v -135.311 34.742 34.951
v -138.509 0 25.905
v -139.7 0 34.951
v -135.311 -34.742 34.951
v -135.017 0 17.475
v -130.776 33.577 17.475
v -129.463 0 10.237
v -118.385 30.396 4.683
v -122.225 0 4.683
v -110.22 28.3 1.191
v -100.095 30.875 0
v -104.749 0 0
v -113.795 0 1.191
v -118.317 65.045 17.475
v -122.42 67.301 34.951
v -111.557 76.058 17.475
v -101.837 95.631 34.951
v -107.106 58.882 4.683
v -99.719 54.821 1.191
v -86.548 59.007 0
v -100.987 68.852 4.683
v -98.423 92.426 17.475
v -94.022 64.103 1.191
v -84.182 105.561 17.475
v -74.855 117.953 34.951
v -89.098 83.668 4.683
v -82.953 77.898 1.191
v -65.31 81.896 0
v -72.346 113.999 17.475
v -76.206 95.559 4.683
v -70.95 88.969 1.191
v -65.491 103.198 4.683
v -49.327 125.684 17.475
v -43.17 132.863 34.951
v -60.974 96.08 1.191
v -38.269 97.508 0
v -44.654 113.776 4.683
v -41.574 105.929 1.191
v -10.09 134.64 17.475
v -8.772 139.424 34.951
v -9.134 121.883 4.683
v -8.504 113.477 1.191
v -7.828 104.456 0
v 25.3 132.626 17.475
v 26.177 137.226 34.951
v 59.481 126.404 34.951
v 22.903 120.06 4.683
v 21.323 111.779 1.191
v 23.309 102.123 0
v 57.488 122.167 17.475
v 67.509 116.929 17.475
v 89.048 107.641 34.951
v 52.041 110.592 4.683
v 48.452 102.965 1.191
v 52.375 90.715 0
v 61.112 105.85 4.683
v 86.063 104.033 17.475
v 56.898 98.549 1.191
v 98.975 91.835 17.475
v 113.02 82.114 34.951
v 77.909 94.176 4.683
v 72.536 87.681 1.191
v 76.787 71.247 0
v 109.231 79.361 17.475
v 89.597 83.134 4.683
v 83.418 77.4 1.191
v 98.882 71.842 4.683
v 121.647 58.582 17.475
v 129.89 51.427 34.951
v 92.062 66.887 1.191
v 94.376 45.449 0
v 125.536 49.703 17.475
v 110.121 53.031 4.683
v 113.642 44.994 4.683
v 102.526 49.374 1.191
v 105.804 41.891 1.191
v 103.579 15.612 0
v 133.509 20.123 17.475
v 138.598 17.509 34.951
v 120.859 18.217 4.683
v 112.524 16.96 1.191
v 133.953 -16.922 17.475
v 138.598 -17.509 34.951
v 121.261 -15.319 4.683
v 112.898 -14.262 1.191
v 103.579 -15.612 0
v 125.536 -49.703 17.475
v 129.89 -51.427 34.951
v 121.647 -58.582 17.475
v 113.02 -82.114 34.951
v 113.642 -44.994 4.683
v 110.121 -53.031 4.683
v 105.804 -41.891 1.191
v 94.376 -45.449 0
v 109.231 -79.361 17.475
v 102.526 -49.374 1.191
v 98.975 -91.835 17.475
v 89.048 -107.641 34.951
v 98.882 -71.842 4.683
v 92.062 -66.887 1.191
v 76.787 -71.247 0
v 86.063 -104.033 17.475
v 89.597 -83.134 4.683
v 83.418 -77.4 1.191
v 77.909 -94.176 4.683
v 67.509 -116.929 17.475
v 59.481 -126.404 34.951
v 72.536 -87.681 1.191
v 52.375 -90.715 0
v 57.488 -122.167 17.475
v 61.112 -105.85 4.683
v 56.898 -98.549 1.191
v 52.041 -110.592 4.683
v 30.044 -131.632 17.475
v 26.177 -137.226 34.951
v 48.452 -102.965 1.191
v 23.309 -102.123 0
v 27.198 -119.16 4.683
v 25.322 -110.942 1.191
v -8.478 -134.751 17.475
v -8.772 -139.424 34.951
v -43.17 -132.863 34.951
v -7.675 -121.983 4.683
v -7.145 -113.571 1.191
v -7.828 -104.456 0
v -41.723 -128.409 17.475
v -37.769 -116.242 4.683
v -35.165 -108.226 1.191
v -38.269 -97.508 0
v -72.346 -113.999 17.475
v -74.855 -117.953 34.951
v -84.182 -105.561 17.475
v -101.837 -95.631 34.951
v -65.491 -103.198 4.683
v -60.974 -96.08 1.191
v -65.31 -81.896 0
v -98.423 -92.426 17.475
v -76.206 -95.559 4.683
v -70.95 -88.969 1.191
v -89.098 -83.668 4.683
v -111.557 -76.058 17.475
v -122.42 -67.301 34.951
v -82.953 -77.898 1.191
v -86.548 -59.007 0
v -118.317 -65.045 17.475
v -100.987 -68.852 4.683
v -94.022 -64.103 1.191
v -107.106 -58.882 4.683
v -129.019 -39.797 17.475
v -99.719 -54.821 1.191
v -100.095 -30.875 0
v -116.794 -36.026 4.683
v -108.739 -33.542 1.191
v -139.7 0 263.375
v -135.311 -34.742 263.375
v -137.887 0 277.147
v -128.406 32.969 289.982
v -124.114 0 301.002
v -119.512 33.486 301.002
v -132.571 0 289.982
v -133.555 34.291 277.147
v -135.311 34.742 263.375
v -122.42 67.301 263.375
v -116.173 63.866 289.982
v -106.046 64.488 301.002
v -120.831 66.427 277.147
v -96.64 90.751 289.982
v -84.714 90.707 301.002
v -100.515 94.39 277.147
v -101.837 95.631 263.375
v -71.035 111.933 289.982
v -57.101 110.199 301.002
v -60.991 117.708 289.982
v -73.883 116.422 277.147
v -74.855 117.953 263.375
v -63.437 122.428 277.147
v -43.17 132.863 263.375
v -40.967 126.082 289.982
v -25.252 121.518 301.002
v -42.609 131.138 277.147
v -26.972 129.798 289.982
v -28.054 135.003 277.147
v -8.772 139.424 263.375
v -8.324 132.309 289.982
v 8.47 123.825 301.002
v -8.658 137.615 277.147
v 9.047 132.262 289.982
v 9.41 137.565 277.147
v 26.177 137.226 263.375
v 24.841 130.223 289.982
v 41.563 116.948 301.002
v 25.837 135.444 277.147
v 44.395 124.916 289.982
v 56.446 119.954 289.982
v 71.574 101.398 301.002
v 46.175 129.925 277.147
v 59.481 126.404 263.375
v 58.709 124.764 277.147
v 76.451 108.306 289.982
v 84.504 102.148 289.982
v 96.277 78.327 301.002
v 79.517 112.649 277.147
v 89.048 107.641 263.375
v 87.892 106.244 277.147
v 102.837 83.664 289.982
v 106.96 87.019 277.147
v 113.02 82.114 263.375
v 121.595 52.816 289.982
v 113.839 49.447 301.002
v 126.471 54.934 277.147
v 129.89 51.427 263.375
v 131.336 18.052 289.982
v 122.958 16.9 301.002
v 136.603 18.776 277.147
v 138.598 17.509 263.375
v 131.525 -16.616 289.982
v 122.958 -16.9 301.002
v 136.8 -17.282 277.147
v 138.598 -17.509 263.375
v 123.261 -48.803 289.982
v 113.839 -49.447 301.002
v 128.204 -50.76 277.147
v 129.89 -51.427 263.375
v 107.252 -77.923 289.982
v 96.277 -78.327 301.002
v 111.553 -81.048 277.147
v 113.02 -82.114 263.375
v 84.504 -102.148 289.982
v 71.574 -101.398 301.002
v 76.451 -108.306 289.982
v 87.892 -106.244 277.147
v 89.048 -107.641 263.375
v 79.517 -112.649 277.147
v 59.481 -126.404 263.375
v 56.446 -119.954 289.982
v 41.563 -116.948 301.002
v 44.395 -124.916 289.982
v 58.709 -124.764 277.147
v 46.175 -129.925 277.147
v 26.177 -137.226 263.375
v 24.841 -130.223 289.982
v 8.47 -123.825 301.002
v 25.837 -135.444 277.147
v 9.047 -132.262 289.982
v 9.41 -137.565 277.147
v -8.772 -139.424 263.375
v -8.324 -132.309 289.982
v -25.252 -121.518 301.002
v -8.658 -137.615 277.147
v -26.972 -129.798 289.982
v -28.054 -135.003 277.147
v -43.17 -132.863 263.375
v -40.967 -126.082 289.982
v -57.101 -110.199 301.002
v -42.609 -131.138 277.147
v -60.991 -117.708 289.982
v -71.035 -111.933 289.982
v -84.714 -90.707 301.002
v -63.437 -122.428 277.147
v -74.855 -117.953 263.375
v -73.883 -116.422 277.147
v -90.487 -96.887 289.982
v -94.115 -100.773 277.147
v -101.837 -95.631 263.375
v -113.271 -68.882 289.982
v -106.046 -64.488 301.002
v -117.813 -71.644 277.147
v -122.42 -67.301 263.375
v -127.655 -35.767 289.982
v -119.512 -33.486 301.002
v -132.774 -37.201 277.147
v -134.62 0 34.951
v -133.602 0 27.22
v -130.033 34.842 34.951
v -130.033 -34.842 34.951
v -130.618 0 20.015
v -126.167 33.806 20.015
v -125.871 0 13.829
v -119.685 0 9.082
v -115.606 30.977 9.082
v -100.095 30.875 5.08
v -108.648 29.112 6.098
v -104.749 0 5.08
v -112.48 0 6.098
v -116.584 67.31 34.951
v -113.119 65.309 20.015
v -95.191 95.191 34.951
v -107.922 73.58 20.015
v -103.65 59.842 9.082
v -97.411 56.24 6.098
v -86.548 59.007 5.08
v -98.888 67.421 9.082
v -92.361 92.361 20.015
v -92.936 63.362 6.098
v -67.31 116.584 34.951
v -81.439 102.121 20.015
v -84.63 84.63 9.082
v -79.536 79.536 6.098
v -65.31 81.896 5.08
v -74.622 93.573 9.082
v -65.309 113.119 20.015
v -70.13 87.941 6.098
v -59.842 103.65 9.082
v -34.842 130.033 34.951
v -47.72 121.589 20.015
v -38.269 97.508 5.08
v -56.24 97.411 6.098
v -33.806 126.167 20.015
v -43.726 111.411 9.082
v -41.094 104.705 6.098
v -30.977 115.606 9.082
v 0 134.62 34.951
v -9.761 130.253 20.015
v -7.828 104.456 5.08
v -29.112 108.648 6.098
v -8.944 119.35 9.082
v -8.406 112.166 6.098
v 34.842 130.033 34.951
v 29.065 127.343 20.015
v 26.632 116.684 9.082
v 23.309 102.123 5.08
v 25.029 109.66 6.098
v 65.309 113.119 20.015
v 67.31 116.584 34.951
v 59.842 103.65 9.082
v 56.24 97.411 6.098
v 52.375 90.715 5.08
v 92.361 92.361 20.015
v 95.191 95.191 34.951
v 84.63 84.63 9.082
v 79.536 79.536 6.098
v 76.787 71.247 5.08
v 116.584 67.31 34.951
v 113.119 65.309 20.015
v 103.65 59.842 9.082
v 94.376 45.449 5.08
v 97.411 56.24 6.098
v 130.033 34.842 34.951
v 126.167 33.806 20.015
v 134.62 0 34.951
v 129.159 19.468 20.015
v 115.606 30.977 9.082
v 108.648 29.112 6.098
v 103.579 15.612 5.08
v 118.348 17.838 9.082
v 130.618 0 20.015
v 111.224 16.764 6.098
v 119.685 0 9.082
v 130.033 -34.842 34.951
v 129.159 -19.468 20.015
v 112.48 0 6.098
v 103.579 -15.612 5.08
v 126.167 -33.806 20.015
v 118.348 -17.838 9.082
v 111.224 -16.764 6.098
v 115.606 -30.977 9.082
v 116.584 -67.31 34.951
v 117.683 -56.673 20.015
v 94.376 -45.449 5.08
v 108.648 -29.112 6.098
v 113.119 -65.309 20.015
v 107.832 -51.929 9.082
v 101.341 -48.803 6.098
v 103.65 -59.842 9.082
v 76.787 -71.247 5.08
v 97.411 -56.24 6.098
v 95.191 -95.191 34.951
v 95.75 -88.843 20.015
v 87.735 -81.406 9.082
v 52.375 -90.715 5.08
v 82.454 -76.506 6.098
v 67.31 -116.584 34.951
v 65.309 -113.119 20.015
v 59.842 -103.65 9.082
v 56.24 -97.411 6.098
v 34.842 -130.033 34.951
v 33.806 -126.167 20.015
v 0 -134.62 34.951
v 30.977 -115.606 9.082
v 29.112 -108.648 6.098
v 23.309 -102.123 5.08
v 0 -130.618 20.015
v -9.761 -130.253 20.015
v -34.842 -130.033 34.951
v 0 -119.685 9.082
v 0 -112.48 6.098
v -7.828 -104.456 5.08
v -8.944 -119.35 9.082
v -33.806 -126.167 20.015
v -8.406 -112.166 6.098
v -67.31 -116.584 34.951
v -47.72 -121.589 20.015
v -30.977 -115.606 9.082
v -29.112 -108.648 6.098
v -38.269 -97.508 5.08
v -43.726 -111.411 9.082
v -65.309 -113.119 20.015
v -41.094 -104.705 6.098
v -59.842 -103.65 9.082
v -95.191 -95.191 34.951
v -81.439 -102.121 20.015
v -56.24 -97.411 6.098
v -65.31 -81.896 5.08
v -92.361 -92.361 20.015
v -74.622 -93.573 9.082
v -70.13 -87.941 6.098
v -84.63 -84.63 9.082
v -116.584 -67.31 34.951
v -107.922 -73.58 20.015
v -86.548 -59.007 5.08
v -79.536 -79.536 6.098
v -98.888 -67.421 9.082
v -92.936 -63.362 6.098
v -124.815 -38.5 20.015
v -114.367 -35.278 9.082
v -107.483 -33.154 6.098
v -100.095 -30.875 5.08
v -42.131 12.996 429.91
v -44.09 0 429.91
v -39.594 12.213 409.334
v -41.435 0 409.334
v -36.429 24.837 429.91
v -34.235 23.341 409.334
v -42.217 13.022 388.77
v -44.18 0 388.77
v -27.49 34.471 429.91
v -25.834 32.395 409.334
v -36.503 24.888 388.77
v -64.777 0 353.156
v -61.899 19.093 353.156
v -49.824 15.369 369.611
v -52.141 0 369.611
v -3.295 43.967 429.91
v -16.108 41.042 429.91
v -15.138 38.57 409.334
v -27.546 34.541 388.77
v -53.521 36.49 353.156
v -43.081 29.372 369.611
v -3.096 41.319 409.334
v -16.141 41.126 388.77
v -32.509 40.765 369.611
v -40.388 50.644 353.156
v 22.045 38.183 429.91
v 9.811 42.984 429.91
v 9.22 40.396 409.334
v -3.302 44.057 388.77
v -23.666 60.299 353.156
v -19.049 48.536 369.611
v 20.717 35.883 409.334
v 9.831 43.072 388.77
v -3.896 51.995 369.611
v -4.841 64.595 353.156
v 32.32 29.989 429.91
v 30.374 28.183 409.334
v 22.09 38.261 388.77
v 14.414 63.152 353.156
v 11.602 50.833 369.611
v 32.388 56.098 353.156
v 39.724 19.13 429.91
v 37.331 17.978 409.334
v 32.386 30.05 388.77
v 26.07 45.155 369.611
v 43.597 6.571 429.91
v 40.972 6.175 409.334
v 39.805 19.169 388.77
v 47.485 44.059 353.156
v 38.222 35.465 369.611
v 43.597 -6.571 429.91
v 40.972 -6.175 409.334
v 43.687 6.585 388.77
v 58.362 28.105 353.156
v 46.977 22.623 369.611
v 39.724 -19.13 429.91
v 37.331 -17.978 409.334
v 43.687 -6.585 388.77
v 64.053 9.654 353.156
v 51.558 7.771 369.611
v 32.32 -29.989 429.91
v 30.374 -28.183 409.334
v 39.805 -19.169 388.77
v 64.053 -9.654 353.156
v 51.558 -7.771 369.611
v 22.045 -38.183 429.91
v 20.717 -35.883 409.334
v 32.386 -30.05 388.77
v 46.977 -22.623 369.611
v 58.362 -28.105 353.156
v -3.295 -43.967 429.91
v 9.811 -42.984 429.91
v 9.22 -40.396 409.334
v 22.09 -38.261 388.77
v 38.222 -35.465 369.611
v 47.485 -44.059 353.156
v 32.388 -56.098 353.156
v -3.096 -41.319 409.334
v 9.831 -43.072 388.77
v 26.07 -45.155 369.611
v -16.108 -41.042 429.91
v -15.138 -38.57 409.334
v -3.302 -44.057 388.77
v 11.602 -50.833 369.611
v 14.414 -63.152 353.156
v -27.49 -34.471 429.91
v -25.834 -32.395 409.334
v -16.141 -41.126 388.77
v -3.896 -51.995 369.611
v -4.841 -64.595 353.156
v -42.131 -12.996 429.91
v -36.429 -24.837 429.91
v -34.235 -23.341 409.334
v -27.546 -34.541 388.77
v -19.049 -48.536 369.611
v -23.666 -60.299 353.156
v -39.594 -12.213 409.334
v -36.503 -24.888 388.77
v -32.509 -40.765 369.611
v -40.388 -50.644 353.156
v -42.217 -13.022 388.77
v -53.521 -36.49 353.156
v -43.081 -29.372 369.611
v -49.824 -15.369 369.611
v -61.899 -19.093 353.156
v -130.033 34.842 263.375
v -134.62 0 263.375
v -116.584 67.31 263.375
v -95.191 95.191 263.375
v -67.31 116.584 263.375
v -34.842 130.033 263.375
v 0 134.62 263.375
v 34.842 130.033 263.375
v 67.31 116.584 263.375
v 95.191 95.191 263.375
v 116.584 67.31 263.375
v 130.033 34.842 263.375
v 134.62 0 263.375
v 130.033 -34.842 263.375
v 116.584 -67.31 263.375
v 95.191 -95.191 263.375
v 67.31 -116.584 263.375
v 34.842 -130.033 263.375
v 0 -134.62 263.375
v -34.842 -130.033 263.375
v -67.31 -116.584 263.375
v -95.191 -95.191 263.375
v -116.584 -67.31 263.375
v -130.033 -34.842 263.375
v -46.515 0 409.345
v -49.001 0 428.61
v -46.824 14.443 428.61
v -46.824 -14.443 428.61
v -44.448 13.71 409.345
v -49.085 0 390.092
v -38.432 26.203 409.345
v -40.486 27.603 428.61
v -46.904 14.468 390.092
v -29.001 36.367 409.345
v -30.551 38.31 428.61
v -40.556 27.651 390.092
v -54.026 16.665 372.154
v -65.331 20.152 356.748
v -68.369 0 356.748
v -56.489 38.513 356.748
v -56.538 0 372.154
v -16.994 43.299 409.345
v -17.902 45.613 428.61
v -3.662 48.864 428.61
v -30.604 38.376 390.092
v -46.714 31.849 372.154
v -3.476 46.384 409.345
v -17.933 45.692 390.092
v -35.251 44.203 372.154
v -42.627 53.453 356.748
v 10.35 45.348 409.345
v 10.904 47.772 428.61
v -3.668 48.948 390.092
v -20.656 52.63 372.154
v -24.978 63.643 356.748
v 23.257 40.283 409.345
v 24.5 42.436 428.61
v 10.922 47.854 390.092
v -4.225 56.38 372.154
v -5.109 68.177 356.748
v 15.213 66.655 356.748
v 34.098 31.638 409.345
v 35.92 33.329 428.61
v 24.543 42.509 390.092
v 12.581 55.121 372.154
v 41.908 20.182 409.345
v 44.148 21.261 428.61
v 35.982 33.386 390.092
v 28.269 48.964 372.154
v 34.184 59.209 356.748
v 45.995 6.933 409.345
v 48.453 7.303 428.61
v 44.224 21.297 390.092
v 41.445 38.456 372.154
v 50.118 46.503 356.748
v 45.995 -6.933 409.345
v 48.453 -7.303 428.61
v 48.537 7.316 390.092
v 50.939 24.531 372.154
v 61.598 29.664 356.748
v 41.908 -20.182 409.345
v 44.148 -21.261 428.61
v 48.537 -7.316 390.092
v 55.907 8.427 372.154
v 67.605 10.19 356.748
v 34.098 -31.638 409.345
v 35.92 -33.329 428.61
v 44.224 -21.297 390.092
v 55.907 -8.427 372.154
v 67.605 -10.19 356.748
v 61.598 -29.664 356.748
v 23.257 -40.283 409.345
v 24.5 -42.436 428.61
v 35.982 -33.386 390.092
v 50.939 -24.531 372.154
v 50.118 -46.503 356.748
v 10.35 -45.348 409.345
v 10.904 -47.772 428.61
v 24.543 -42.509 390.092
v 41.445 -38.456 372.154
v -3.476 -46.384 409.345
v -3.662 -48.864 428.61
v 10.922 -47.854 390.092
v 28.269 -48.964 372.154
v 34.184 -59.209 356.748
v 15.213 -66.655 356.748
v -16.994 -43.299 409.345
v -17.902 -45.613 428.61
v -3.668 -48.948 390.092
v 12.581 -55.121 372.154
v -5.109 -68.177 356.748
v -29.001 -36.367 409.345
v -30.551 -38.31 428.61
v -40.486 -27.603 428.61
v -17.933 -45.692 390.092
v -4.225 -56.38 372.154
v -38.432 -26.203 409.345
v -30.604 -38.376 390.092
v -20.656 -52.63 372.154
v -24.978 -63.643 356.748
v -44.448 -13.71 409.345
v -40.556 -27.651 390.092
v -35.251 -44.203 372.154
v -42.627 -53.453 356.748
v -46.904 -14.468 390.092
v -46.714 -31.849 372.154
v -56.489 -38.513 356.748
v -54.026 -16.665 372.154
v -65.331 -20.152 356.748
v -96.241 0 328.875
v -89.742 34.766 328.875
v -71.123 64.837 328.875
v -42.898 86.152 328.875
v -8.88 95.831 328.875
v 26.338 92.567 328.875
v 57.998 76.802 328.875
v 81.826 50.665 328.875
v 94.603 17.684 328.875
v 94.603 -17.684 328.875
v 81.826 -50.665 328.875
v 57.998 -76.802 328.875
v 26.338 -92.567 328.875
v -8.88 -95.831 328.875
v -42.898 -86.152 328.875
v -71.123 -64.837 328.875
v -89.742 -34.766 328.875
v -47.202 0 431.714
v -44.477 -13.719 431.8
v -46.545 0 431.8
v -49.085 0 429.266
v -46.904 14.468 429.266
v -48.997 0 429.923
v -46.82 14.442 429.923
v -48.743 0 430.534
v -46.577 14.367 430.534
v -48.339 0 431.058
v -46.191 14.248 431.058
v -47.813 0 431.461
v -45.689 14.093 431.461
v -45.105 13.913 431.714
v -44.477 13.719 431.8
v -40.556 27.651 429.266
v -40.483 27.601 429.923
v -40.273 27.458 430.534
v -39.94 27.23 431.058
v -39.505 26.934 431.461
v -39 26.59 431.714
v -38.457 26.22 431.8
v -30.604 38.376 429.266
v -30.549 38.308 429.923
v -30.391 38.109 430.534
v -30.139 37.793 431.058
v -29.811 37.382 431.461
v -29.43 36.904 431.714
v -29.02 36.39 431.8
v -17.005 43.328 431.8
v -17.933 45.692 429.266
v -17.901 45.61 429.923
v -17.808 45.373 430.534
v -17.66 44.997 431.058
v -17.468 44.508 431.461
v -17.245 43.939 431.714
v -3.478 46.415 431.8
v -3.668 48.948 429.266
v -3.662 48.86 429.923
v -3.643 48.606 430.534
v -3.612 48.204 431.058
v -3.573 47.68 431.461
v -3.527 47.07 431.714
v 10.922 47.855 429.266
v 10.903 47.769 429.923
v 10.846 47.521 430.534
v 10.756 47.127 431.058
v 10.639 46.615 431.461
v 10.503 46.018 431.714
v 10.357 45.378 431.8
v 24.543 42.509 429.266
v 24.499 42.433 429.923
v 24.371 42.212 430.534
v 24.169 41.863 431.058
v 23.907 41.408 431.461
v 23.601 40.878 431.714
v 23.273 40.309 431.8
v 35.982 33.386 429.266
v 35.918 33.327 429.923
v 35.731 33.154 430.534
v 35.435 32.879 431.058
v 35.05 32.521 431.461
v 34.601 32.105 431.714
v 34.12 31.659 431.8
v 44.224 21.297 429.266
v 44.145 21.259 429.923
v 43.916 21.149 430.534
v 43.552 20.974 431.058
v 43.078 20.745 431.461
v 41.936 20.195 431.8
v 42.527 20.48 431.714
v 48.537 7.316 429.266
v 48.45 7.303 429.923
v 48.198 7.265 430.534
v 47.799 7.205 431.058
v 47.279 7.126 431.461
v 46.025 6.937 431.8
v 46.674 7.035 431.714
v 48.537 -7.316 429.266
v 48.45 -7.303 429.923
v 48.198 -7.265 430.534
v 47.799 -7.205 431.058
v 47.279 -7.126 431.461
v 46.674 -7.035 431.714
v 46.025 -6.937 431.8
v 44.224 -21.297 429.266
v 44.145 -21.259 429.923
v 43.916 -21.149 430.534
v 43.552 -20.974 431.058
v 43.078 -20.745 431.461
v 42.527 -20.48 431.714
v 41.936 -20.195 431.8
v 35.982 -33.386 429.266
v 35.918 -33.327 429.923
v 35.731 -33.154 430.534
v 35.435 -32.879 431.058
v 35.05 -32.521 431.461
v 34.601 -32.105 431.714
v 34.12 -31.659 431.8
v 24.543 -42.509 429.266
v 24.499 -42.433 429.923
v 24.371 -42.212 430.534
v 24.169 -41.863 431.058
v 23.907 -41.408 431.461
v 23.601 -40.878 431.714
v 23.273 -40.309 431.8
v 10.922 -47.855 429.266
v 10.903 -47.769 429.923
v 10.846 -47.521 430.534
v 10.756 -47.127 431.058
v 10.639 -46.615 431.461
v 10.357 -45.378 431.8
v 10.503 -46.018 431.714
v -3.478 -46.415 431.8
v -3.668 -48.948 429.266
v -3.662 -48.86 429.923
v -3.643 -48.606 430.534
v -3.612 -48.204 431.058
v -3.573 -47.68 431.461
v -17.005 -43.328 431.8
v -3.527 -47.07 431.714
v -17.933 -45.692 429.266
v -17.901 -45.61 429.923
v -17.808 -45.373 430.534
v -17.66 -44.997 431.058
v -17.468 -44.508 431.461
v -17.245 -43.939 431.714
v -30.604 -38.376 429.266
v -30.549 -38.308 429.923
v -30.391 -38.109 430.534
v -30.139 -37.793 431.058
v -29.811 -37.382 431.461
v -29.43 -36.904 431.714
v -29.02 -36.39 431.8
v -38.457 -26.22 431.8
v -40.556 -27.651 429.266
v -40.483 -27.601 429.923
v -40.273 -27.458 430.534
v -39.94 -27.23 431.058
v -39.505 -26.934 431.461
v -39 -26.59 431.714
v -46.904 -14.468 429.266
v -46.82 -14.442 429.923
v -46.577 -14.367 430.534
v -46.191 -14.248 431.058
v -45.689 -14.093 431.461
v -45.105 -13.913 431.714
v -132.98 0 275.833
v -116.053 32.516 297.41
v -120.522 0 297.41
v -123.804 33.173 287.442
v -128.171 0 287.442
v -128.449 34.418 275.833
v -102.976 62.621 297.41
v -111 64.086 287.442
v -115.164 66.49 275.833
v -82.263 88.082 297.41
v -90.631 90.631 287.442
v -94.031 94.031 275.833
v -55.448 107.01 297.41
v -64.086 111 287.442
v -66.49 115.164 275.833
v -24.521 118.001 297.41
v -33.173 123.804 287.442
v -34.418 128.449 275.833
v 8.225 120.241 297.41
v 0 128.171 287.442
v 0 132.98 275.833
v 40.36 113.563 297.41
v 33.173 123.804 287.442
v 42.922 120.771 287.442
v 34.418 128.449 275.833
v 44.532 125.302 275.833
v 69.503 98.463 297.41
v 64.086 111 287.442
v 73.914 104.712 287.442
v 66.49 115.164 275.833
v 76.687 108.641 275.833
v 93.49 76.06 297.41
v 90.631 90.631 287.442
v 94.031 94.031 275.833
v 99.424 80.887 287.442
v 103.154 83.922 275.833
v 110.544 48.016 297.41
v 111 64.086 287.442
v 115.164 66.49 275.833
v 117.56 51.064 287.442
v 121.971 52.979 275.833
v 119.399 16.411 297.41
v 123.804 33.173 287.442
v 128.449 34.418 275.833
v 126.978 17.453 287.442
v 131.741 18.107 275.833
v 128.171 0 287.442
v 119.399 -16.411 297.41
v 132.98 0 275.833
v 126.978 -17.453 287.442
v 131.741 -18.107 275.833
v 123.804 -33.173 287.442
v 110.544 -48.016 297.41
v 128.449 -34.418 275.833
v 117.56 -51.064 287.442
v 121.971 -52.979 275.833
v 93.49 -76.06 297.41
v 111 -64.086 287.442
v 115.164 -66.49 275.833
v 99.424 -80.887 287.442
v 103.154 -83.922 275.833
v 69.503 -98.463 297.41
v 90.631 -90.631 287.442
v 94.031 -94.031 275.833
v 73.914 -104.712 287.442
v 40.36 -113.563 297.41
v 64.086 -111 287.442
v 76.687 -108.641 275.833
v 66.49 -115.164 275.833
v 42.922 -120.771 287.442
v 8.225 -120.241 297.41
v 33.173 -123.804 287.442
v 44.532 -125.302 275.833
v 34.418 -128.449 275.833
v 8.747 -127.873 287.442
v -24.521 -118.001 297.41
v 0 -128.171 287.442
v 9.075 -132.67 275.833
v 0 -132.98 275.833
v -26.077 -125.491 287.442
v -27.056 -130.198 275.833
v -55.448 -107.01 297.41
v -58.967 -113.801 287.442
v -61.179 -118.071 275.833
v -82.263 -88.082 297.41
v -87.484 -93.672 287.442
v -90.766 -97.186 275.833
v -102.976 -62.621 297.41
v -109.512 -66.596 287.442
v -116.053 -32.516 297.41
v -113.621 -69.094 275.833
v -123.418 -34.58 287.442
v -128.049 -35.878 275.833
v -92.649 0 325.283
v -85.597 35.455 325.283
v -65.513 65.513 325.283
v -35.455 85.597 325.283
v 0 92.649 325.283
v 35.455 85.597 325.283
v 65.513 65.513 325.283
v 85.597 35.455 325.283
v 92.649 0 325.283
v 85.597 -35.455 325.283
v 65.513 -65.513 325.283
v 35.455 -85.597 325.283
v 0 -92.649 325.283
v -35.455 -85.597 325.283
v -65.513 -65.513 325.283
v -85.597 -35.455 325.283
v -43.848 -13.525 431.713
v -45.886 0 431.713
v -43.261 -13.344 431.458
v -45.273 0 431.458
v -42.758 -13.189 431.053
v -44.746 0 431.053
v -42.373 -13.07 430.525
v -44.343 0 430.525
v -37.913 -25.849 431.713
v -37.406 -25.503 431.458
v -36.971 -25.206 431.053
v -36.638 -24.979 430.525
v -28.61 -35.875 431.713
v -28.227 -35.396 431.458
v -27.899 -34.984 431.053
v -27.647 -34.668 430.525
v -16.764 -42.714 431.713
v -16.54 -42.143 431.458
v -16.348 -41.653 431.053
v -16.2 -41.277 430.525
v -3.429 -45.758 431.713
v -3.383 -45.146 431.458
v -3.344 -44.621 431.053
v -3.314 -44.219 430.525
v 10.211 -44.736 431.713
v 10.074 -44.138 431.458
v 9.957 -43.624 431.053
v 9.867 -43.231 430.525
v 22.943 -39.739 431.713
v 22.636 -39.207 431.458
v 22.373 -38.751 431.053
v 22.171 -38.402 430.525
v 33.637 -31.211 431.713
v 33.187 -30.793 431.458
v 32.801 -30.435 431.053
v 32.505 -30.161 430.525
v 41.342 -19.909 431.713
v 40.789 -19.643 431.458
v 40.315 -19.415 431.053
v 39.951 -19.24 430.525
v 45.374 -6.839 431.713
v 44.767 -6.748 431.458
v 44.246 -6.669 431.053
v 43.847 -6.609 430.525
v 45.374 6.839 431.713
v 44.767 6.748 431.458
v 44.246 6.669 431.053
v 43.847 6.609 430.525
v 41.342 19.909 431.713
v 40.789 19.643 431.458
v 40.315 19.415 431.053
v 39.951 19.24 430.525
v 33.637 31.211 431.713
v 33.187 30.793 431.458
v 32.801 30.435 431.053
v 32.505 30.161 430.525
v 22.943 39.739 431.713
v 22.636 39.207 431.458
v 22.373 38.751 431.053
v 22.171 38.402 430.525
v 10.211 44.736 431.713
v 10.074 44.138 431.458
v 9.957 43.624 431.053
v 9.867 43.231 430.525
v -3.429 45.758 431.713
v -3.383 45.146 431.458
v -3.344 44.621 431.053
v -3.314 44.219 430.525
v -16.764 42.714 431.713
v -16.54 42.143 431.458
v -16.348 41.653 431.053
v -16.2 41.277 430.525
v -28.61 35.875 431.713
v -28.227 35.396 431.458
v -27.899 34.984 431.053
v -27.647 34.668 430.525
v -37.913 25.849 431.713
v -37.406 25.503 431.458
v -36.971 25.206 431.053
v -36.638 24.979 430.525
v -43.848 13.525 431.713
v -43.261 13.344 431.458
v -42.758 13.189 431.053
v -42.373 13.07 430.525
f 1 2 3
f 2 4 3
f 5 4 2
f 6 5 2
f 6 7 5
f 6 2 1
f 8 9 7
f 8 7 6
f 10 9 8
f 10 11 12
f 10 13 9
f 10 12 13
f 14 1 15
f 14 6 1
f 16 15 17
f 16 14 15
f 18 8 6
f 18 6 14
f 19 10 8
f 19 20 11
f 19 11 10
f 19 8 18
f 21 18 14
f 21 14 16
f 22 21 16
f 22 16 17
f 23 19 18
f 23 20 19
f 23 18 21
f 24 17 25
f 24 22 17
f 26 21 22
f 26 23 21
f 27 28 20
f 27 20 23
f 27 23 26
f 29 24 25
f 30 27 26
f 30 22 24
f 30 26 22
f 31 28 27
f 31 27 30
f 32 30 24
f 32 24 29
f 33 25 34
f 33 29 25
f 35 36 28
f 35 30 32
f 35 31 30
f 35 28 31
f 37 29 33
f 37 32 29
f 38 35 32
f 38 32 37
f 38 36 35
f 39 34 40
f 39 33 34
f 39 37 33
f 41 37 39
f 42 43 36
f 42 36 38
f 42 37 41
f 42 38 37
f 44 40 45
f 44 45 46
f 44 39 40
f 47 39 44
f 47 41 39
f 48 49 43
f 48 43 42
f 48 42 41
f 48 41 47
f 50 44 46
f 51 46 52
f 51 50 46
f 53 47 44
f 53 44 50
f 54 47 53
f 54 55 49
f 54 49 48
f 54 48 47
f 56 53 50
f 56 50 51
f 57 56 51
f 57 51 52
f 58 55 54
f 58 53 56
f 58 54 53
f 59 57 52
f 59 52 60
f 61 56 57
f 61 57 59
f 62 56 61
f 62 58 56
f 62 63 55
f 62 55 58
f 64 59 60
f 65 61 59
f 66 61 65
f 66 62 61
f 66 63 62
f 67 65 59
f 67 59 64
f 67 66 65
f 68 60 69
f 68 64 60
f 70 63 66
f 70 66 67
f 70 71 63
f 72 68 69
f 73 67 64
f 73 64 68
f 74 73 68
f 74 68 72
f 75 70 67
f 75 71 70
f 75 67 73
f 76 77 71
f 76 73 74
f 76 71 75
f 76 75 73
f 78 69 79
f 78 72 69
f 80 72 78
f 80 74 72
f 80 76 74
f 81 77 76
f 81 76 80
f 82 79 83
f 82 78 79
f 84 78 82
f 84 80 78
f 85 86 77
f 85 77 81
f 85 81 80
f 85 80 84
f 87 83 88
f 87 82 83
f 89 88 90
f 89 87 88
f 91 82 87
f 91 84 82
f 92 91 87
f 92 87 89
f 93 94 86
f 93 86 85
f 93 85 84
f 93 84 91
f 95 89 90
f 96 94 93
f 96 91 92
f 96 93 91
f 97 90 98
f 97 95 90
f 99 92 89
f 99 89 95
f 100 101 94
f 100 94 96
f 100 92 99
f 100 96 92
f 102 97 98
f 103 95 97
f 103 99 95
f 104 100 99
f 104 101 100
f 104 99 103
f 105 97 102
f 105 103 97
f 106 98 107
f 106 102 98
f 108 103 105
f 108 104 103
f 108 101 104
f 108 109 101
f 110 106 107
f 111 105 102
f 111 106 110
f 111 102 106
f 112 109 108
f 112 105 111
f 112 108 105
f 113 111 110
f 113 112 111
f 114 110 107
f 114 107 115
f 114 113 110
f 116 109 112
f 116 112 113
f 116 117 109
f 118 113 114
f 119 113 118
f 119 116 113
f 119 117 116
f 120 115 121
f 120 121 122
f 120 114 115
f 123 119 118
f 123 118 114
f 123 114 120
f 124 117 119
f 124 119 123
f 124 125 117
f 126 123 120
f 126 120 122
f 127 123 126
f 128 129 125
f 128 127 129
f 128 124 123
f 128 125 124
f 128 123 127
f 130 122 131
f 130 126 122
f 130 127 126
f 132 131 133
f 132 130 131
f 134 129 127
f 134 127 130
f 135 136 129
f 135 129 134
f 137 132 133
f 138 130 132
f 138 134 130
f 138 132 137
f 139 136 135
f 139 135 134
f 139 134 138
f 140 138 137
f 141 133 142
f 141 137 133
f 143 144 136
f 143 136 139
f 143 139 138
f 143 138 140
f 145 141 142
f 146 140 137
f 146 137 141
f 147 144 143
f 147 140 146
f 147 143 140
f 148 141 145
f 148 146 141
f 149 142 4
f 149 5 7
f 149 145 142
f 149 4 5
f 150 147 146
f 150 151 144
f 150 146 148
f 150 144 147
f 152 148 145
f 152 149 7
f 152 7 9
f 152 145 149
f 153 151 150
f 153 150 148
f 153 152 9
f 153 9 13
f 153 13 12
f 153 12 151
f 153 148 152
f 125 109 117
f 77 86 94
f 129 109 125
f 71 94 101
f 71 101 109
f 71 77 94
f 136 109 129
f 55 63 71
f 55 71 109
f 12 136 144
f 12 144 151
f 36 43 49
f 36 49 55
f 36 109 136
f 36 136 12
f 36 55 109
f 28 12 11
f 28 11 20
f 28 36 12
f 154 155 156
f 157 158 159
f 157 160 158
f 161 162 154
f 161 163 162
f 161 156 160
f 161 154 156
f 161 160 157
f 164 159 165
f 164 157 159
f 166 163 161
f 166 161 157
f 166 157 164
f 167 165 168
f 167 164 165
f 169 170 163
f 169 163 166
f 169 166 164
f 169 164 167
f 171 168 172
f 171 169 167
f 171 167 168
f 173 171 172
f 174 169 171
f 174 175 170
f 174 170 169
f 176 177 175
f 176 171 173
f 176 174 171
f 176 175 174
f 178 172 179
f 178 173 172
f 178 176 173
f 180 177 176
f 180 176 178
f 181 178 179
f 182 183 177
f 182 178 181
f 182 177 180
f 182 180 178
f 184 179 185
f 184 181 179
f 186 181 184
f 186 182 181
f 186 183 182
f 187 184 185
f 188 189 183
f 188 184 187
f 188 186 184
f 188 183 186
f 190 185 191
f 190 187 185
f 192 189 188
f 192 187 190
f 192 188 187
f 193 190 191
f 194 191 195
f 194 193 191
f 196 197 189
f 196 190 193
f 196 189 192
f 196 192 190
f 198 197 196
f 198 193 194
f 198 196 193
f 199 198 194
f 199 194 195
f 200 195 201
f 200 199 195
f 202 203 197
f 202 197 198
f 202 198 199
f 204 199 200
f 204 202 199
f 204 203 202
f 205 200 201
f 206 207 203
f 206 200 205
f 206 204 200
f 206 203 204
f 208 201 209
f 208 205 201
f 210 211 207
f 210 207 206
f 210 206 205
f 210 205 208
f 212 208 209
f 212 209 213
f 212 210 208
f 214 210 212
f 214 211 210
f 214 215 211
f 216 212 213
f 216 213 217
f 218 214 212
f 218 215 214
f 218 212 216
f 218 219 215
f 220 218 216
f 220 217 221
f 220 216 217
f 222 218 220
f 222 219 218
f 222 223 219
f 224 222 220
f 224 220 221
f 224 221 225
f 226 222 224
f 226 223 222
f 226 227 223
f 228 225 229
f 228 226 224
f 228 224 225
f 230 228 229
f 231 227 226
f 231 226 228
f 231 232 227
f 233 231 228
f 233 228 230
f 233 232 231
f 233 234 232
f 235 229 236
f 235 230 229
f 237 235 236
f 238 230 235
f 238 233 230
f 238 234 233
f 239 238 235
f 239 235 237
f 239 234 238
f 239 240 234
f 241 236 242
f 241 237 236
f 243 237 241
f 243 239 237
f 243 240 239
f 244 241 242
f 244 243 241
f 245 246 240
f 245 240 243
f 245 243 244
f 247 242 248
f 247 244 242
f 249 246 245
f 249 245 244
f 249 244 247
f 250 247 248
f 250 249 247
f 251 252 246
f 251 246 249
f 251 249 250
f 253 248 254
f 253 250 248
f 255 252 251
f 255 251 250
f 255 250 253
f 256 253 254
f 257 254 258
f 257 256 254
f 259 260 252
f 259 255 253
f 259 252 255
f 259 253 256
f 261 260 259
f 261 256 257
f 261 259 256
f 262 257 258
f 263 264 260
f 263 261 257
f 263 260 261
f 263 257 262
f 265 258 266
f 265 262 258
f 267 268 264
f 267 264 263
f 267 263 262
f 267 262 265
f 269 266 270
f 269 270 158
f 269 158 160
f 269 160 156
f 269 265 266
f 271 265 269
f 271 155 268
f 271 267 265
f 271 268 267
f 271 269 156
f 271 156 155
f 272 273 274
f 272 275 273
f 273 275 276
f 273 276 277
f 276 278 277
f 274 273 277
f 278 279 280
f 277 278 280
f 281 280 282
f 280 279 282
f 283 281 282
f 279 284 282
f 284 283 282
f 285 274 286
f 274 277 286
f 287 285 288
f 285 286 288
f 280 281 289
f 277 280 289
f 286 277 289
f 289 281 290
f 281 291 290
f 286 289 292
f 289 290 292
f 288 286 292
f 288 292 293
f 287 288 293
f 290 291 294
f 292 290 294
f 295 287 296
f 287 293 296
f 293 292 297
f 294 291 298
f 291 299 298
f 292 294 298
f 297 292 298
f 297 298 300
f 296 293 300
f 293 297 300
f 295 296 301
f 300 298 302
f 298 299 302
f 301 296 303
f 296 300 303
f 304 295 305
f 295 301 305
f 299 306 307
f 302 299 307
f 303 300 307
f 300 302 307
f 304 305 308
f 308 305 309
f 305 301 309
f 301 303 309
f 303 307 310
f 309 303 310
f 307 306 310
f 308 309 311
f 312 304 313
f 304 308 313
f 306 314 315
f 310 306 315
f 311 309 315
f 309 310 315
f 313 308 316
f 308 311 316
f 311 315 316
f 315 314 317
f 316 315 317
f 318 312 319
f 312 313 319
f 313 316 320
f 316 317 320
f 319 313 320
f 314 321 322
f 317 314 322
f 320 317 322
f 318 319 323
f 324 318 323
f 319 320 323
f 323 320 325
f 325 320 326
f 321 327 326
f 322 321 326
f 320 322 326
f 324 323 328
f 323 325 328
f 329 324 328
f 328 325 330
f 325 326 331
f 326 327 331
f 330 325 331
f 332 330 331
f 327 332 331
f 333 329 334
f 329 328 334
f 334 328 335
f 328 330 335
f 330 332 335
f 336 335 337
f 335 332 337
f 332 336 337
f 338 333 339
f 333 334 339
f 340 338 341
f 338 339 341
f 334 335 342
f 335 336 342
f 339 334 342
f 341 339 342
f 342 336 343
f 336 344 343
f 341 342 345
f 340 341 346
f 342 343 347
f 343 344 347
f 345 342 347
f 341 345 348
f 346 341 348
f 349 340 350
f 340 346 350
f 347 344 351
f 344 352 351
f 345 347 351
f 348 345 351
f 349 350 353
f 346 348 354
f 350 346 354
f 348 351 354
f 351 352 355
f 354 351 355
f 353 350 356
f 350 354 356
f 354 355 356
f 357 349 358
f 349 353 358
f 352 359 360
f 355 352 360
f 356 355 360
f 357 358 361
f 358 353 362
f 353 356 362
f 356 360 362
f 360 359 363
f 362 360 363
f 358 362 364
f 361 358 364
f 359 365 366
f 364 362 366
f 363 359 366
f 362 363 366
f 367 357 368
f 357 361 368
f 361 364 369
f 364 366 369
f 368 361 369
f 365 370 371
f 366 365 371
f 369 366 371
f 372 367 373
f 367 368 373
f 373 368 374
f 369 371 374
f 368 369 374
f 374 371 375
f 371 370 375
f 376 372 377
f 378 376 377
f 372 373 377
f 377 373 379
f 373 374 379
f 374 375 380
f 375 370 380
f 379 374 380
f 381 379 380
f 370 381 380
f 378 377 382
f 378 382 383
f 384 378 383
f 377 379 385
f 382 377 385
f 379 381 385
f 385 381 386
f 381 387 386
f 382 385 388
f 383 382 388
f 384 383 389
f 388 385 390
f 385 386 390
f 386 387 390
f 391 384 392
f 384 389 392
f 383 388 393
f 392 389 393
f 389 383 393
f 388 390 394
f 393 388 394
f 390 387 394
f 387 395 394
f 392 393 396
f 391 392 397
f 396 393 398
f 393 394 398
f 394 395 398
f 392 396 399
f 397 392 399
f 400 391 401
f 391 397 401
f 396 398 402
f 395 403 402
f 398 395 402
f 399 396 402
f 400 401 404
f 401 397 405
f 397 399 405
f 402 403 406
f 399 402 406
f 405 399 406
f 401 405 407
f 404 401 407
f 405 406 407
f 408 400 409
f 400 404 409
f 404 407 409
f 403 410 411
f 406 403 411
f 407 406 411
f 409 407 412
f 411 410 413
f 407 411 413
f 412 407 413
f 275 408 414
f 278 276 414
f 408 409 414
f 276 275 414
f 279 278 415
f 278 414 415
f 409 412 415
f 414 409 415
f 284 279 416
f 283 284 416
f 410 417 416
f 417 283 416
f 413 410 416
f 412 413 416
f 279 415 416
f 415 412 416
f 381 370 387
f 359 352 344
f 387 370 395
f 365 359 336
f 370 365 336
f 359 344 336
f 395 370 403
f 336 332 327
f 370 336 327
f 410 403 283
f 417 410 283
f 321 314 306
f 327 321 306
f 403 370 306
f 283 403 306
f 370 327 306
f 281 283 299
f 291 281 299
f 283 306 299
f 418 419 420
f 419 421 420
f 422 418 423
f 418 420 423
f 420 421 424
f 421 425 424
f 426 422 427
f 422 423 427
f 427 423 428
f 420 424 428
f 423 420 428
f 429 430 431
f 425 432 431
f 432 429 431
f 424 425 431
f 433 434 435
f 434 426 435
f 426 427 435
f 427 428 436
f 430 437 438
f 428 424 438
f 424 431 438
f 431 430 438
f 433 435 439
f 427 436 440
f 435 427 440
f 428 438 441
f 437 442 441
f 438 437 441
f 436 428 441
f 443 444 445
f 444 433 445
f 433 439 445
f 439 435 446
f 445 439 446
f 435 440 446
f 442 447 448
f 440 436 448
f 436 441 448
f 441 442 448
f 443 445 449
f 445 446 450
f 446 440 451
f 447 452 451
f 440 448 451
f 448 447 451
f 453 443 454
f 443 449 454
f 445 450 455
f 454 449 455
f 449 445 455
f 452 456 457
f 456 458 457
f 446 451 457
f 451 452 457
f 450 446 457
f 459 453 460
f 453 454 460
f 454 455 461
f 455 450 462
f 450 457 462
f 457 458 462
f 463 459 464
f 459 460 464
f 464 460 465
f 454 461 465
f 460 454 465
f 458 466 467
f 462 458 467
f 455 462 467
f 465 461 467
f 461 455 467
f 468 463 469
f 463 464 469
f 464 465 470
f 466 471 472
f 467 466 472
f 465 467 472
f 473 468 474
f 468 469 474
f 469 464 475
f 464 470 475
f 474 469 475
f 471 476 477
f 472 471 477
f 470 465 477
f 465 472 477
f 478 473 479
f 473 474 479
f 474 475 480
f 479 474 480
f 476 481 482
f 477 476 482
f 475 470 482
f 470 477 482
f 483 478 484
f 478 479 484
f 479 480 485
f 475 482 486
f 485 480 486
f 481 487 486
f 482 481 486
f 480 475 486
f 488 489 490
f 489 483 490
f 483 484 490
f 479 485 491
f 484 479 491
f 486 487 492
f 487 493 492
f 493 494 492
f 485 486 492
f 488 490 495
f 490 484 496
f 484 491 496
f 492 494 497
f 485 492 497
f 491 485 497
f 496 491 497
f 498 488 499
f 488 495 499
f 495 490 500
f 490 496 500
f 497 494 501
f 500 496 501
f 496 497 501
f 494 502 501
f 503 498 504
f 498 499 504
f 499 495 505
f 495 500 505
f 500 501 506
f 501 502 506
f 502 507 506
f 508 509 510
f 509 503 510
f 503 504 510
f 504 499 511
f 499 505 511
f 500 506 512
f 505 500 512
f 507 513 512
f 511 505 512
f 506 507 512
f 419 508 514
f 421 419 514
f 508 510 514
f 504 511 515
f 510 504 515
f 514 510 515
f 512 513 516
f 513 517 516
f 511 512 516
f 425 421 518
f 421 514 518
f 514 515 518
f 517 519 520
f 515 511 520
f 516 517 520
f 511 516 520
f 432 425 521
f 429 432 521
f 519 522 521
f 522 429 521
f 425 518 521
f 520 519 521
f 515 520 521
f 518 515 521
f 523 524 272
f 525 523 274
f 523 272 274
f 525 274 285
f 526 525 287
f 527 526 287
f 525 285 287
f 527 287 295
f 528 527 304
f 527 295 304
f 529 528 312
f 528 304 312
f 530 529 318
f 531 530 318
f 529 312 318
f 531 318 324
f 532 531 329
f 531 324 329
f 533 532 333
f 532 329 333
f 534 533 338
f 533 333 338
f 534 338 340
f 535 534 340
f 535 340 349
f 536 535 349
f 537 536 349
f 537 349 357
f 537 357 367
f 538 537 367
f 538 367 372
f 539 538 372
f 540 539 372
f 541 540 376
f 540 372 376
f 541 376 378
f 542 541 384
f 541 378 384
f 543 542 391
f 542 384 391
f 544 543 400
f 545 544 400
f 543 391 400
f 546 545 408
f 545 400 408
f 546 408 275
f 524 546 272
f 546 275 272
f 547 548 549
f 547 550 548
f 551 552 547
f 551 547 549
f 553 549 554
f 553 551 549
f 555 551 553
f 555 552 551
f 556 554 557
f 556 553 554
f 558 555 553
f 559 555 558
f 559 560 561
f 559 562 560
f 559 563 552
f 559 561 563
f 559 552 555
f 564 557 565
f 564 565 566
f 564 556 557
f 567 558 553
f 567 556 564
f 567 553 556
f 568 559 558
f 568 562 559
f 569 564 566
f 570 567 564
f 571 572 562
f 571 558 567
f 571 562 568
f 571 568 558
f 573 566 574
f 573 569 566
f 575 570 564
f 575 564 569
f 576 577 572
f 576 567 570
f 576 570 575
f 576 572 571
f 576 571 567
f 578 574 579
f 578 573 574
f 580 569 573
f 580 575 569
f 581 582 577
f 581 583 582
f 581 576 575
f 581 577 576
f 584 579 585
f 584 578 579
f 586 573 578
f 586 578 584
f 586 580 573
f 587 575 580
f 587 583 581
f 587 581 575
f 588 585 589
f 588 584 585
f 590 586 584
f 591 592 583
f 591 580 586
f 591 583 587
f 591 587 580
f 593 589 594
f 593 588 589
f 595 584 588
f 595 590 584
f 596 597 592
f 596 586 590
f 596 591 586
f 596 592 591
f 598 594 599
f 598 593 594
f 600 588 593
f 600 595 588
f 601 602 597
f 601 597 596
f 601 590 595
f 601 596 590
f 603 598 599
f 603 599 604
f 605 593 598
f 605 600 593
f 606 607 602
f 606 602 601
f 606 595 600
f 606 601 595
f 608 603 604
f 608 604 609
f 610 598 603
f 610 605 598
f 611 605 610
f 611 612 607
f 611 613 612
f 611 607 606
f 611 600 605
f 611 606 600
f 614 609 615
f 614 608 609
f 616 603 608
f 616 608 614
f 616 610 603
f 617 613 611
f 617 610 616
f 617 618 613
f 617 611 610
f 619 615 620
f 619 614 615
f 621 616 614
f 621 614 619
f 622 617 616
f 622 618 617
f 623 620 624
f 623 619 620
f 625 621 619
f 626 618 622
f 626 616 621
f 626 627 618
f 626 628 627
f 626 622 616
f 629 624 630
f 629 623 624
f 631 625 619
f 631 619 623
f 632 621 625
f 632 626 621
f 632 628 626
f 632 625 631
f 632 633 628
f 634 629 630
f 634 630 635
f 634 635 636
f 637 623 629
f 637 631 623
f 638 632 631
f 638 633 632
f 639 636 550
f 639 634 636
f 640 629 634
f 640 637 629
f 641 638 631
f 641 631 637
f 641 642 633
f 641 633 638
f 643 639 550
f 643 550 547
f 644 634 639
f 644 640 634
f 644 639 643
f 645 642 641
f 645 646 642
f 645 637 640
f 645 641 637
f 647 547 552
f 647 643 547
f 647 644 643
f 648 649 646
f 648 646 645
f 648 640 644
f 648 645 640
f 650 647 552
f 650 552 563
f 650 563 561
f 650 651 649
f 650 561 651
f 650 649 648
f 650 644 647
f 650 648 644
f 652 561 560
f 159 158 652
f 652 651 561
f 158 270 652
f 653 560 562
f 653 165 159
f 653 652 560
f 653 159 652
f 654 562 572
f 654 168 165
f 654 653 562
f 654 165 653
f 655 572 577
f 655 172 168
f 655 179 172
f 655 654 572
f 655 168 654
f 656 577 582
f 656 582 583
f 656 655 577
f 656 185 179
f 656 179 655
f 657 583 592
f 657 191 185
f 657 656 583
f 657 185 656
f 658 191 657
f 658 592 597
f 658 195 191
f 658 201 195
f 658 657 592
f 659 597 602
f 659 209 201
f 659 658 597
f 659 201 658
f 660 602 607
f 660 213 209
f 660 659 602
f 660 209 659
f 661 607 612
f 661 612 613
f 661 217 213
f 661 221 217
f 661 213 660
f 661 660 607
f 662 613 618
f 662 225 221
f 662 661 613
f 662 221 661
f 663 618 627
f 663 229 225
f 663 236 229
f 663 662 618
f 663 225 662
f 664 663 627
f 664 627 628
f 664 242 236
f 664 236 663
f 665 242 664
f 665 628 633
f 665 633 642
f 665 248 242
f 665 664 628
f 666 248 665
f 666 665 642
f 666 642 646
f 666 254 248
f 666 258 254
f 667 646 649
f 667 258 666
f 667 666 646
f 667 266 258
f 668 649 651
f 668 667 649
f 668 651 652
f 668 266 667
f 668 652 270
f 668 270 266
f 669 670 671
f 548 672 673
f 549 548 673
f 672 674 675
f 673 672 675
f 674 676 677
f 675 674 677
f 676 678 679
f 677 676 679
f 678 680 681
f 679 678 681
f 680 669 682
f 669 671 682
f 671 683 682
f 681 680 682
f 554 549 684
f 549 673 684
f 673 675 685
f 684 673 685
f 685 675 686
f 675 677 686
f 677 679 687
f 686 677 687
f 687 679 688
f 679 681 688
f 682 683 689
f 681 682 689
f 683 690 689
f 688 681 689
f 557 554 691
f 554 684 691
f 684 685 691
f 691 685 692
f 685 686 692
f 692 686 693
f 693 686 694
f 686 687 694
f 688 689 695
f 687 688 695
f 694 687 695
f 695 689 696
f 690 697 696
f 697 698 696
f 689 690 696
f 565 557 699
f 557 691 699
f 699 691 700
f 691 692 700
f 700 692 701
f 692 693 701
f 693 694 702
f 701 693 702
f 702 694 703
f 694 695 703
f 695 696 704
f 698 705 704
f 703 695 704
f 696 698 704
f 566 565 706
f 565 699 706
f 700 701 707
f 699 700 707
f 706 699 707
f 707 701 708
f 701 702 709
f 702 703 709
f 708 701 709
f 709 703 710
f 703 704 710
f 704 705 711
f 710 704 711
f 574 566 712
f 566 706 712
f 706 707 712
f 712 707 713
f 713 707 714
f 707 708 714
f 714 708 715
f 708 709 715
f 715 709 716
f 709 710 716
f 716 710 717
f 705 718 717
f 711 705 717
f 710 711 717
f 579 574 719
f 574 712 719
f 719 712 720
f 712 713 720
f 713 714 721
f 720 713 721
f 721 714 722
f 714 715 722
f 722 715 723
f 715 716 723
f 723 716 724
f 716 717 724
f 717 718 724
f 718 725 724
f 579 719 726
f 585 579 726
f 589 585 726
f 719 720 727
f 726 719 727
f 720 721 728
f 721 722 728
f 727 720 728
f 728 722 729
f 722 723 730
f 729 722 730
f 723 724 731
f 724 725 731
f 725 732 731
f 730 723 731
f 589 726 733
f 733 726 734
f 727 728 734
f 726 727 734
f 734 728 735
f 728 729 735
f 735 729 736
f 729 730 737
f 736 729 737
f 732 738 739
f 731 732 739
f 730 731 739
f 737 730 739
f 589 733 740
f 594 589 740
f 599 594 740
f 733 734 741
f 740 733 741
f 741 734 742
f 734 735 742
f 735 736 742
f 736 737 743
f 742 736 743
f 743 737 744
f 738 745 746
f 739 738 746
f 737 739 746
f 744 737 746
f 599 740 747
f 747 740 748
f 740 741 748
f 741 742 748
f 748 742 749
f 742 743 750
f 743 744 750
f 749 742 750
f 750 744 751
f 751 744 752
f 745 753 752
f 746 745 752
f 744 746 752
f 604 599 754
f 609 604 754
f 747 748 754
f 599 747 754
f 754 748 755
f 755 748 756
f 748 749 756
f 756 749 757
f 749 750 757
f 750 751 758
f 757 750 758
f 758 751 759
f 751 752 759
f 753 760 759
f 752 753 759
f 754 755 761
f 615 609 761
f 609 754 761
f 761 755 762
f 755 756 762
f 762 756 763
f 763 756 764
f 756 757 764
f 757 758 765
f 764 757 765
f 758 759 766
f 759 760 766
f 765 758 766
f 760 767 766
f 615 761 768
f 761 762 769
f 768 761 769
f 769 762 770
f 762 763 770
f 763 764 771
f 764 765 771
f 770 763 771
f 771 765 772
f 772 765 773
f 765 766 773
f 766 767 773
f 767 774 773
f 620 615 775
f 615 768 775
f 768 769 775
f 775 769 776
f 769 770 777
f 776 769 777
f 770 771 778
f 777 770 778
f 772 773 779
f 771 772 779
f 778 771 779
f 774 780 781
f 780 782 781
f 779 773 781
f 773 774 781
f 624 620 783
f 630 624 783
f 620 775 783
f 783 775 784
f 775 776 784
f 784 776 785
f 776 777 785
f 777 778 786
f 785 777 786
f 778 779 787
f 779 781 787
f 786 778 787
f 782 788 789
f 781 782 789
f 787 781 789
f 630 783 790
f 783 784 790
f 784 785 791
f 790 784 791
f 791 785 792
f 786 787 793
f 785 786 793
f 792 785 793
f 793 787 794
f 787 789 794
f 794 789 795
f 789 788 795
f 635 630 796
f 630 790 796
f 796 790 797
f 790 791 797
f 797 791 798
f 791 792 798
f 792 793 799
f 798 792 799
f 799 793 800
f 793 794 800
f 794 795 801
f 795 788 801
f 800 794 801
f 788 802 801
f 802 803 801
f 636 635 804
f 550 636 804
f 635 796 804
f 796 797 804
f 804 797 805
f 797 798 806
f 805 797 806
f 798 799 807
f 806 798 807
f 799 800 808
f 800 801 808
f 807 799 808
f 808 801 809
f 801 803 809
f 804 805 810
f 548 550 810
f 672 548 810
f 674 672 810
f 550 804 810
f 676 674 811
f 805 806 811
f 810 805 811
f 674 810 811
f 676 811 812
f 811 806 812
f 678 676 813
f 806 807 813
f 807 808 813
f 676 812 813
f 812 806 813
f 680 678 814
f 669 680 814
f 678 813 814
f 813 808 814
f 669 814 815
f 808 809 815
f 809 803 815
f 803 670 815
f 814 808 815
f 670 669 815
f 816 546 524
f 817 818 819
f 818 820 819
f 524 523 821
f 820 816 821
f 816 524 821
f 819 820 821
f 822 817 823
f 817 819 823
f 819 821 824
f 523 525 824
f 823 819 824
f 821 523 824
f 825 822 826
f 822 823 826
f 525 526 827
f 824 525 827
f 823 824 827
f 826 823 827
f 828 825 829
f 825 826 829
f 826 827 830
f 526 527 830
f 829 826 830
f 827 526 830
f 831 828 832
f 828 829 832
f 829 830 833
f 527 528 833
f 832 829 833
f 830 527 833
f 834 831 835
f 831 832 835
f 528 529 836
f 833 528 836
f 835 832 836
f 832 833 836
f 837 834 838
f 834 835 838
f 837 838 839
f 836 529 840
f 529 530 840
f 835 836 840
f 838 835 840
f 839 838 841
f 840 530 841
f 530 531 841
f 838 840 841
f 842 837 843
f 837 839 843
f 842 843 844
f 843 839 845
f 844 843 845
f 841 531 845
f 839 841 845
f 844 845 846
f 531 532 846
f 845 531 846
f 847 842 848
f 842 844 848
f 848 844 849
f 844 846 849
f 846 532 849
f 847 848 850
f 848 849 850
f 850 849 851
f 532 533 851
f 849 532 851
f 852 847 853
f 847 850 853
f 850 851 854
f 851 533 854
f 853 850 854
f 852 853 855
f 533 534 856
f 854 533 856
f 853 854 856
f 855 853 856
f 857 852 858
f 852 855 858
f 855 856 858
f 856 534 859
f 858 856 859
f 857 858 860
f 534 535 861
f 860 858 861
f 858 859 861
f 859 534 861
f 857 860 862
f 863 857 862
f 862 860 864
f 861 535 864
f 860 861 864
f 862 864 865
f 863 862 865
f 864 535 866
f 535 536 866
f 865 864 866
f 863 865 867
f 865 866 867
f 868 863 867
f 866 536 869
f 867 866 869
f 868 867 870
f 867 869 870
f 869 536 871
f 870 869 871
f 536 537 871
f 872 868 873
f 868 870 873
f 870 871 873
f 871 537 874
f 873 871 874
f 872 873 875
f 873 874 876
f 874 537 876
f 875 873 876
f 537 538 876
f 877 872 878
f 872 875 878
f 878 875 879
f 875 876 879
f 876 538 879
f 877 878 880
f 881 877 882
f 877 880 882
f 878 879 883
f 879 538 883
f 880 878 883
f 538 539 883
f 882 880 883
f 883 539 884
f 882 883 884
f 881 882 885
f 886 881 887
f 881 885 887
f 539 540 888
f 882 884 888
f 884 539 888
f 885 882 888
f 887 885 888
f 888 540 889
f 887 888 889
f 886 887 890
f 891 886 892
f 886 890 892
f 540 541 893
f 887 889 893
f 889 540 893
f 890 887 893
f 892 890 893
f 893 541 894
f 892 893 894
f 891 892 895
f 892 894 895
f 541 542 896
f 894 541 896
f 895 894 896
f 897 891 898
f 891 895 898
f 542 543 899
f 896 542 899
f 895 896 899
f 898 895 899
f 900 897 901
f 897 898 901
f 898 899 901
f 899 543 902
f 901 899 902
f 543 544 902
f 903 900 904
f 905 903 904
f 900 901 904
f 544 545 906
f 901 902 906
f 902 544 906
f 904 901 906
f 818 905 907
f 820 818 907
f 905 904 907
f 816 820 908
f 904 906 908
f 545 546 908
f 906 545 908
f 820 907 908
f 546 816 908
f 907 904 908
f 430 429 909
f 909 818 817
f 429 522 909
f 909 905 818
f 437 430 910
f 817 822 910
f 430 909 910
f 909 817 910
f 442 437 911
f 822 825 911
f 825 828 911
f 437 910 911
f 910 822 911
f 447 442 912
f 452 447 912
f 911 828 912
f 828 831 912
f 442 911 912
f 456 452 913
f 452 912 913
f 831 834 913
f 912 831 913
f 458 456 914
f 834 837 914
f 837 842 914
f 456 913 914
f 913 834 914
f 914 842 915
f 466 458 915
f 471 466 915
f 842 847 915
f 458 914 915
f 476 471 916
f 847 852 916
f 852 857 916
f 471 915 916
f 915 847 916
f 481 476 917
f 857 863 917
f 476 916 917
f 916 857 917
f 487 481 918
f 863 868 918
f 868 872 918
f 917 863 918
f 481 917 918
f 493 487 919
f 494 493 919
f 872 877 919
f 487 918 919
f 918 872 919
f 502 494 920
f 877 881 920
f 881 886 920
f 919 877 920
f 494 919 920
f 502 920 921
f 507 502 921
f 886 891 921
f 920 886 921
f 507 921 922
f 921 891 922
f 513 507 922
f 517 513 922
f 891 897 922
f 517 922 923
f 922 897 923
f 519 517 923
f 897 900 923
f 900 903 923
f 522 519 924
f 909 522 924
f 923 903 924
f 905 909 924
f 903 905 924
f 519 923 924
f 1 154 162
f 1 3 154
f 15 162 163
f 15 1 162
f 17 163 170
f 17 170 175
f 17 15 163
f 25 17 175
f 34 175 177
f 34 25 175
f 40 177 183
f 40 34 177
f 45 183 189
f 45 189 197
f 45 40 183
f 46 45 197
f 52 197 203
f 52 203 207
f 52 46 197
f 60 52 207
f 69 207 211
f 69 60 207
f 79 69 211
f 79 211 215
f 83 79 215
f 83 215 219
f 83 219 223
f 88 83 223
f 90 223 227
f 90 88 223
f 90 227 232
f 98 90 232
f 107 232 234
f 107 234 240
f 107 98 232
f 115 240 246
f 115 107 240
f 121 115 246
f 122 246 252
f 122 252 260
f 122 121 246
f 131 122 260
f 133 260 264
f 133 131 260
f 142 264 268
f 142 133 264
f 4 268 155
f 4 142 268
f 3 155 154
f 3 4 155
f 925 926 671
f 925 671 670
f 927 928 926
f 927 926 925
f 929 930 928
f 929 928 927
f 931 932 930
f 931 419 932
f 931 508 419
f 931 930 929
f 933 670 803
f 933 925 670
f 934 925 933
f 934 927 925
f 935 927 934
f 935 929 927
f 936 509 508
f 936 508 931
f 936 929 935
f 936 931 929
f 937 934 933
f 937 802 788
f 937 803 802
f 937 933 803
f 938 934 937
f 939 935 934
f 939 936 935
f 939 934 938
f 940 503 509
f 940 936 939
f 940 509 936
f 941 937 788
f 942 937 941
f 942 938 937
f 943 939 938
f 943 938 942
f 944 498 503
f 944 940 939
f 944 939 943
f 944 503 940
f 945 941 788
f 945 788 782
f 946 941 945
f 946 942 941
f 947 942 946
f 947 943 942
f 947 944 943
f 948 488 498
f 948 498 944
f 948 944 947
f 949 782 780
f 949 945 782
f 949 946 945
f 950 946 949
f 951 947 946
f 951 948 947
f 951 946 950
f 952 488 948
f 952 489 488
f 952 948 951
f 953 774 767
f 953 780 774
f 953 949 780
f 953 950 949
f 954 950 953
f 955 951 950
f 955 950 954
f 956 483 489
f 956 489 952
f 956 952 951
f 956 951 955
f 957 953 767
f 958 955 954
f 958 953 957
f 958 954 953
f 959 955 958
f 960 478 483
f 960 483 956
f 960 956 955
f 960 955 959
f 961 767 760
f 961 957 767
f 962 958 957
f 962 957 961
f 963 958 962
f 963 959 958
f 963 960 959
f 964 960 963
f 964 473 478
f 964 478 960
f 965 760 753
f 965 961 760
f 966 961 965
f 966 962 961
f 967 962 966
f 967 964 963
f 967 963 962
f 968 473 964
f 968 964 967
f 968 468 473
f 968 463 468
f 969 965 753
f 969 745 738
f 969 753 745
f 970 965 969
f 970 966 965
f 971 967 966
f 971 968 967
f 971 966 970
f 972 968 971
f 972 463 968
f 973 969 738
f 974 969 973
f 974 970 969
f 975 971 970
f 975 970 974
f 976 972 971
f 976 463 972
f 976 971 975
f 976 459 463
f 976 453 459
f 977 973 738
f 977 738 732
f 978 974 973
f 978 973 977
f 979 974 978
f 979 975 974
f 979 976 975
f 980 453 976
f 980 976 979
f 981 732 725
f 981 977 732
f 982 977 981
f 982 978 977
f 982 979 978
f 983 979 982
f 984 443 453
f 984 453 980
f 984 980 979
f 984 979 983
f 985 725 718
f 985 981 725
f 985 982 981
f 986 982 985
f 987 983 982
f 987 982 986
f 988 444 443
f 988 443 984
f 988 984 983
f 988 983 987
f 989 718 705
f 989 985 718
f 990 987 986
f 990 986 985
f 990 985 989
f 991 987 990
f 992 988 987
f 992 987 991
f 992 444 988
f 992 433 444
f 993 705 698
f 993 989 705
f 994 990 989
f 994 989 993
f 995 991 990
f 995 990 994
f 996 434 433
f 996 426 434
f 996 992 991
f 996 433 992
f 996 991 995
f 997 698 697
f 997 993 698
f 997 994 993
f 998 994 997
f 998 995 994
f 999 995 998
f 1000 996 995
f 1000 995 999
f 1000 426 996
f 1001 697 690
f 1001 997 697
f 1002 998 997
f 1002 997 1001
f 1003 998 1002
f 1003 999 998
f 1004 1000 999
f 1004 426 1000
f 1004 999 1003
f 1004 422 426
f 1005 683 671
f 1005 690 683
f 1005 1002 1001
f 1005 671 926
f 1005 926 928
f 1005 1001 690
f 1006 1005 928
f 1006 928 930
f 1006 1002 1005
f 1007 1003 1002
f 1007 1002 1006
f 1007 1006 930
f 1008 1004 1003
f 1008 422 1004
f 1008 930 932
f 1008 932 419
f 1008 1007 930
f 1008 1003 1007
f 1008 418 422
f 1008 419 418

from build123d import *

# Parameters (mm, degrees)
F2_T = -5.08


# Not quite as in the source:
# - a fillet or chamfer that OpenCascade refuses, or shapes differently, is made with other operations: its cross-section is extruded or revolved along the edge and cut away or added


with BuildPart() as f1:
    # F0 (on Front) → F1 (revolve)
    with BuildSketch(Plane.XZ):
        with BuildLine():
            Line((-104.749092273, 0), (0, 0))
            Line((0, 0), (0, 431.8))
            Line((0, 431.8), (-49.921810742, 431.8))
            ThreePointArc((-49.921810742, 431.8), (-48.6708978442, 391.6994834486), (-68.3686659031, 356.7478862853))
            Line((-68.3686659031, 356.7478862853), (-124.1141319396, 301.0024202488))
            ThreePointArc((-124.1141319396, 301.0024202488), (-135.6493648648, 283.7387241792), (-139.7, 263.374806196))
            Line((-139.7, 263.374806196), (-139.7, 34.950907727))
            ThreePointArc((-139.7, 34.950907727), (-129.4631161354, 10.2368838646), (-104.749092273, 0))
        make_face()
    revolve(axis=Axis((0, 0, 215.9), (0, 0, -1)))

    # F2
    f2_openings = [f1.faces().sort_by_distance(p)[0] for p in [
        (0, 0, 431.8),
    ]]
    offset(amount=F2_T, openings=f2_openings)

    # F3: fillet of radius 2.54 on 2 edges, made by hand

    # F3_s1 → F3_t2 (revolve, cut)
    with BuildSketch(Plane.XZ):
        with BuildLine():
            ThreePointArc((-49.0005618222, 428.6097837881), (-48.558048849, 430.8092015398), (-46.5451964974, 431.8))
            Line((-46.5451964974, 431.8), (-49.921810742, 431.8))
            ThreePointArc((-49.921810742, 431.8), (-49.4434375246, 430.2100172594), (-49.0005618222, 428.6097837881))
        make_face()
    revolve(axis=Axis((0, 0, 431.8), (0, 0, -1)), mode=Mode.SUBTRACT)

    # F3_s3 → F3_t4 (revolve, cut)
    with BuildSketch(Plane.XZ):
        with BuildLine():
            ThreePointArc((-46.5451964974, 431.8), (-44.9959949577, 431.2728523515), (-44.0898311727, 429.9102162119))
            ThreePointArc((-44.0898311727, 429.9102162119), (-44.3467229528, 430.8567245972), (-44.6152430168, 431.8))
            Line((-44.6152430168, 431.8), (-46.5451964974, 431.8))
        make_face()
    revolve(axis=Axis((0, 0, 431.8), (0, 0, 1)), mode=Mode.SUBTRACT)


solid = f1.part
